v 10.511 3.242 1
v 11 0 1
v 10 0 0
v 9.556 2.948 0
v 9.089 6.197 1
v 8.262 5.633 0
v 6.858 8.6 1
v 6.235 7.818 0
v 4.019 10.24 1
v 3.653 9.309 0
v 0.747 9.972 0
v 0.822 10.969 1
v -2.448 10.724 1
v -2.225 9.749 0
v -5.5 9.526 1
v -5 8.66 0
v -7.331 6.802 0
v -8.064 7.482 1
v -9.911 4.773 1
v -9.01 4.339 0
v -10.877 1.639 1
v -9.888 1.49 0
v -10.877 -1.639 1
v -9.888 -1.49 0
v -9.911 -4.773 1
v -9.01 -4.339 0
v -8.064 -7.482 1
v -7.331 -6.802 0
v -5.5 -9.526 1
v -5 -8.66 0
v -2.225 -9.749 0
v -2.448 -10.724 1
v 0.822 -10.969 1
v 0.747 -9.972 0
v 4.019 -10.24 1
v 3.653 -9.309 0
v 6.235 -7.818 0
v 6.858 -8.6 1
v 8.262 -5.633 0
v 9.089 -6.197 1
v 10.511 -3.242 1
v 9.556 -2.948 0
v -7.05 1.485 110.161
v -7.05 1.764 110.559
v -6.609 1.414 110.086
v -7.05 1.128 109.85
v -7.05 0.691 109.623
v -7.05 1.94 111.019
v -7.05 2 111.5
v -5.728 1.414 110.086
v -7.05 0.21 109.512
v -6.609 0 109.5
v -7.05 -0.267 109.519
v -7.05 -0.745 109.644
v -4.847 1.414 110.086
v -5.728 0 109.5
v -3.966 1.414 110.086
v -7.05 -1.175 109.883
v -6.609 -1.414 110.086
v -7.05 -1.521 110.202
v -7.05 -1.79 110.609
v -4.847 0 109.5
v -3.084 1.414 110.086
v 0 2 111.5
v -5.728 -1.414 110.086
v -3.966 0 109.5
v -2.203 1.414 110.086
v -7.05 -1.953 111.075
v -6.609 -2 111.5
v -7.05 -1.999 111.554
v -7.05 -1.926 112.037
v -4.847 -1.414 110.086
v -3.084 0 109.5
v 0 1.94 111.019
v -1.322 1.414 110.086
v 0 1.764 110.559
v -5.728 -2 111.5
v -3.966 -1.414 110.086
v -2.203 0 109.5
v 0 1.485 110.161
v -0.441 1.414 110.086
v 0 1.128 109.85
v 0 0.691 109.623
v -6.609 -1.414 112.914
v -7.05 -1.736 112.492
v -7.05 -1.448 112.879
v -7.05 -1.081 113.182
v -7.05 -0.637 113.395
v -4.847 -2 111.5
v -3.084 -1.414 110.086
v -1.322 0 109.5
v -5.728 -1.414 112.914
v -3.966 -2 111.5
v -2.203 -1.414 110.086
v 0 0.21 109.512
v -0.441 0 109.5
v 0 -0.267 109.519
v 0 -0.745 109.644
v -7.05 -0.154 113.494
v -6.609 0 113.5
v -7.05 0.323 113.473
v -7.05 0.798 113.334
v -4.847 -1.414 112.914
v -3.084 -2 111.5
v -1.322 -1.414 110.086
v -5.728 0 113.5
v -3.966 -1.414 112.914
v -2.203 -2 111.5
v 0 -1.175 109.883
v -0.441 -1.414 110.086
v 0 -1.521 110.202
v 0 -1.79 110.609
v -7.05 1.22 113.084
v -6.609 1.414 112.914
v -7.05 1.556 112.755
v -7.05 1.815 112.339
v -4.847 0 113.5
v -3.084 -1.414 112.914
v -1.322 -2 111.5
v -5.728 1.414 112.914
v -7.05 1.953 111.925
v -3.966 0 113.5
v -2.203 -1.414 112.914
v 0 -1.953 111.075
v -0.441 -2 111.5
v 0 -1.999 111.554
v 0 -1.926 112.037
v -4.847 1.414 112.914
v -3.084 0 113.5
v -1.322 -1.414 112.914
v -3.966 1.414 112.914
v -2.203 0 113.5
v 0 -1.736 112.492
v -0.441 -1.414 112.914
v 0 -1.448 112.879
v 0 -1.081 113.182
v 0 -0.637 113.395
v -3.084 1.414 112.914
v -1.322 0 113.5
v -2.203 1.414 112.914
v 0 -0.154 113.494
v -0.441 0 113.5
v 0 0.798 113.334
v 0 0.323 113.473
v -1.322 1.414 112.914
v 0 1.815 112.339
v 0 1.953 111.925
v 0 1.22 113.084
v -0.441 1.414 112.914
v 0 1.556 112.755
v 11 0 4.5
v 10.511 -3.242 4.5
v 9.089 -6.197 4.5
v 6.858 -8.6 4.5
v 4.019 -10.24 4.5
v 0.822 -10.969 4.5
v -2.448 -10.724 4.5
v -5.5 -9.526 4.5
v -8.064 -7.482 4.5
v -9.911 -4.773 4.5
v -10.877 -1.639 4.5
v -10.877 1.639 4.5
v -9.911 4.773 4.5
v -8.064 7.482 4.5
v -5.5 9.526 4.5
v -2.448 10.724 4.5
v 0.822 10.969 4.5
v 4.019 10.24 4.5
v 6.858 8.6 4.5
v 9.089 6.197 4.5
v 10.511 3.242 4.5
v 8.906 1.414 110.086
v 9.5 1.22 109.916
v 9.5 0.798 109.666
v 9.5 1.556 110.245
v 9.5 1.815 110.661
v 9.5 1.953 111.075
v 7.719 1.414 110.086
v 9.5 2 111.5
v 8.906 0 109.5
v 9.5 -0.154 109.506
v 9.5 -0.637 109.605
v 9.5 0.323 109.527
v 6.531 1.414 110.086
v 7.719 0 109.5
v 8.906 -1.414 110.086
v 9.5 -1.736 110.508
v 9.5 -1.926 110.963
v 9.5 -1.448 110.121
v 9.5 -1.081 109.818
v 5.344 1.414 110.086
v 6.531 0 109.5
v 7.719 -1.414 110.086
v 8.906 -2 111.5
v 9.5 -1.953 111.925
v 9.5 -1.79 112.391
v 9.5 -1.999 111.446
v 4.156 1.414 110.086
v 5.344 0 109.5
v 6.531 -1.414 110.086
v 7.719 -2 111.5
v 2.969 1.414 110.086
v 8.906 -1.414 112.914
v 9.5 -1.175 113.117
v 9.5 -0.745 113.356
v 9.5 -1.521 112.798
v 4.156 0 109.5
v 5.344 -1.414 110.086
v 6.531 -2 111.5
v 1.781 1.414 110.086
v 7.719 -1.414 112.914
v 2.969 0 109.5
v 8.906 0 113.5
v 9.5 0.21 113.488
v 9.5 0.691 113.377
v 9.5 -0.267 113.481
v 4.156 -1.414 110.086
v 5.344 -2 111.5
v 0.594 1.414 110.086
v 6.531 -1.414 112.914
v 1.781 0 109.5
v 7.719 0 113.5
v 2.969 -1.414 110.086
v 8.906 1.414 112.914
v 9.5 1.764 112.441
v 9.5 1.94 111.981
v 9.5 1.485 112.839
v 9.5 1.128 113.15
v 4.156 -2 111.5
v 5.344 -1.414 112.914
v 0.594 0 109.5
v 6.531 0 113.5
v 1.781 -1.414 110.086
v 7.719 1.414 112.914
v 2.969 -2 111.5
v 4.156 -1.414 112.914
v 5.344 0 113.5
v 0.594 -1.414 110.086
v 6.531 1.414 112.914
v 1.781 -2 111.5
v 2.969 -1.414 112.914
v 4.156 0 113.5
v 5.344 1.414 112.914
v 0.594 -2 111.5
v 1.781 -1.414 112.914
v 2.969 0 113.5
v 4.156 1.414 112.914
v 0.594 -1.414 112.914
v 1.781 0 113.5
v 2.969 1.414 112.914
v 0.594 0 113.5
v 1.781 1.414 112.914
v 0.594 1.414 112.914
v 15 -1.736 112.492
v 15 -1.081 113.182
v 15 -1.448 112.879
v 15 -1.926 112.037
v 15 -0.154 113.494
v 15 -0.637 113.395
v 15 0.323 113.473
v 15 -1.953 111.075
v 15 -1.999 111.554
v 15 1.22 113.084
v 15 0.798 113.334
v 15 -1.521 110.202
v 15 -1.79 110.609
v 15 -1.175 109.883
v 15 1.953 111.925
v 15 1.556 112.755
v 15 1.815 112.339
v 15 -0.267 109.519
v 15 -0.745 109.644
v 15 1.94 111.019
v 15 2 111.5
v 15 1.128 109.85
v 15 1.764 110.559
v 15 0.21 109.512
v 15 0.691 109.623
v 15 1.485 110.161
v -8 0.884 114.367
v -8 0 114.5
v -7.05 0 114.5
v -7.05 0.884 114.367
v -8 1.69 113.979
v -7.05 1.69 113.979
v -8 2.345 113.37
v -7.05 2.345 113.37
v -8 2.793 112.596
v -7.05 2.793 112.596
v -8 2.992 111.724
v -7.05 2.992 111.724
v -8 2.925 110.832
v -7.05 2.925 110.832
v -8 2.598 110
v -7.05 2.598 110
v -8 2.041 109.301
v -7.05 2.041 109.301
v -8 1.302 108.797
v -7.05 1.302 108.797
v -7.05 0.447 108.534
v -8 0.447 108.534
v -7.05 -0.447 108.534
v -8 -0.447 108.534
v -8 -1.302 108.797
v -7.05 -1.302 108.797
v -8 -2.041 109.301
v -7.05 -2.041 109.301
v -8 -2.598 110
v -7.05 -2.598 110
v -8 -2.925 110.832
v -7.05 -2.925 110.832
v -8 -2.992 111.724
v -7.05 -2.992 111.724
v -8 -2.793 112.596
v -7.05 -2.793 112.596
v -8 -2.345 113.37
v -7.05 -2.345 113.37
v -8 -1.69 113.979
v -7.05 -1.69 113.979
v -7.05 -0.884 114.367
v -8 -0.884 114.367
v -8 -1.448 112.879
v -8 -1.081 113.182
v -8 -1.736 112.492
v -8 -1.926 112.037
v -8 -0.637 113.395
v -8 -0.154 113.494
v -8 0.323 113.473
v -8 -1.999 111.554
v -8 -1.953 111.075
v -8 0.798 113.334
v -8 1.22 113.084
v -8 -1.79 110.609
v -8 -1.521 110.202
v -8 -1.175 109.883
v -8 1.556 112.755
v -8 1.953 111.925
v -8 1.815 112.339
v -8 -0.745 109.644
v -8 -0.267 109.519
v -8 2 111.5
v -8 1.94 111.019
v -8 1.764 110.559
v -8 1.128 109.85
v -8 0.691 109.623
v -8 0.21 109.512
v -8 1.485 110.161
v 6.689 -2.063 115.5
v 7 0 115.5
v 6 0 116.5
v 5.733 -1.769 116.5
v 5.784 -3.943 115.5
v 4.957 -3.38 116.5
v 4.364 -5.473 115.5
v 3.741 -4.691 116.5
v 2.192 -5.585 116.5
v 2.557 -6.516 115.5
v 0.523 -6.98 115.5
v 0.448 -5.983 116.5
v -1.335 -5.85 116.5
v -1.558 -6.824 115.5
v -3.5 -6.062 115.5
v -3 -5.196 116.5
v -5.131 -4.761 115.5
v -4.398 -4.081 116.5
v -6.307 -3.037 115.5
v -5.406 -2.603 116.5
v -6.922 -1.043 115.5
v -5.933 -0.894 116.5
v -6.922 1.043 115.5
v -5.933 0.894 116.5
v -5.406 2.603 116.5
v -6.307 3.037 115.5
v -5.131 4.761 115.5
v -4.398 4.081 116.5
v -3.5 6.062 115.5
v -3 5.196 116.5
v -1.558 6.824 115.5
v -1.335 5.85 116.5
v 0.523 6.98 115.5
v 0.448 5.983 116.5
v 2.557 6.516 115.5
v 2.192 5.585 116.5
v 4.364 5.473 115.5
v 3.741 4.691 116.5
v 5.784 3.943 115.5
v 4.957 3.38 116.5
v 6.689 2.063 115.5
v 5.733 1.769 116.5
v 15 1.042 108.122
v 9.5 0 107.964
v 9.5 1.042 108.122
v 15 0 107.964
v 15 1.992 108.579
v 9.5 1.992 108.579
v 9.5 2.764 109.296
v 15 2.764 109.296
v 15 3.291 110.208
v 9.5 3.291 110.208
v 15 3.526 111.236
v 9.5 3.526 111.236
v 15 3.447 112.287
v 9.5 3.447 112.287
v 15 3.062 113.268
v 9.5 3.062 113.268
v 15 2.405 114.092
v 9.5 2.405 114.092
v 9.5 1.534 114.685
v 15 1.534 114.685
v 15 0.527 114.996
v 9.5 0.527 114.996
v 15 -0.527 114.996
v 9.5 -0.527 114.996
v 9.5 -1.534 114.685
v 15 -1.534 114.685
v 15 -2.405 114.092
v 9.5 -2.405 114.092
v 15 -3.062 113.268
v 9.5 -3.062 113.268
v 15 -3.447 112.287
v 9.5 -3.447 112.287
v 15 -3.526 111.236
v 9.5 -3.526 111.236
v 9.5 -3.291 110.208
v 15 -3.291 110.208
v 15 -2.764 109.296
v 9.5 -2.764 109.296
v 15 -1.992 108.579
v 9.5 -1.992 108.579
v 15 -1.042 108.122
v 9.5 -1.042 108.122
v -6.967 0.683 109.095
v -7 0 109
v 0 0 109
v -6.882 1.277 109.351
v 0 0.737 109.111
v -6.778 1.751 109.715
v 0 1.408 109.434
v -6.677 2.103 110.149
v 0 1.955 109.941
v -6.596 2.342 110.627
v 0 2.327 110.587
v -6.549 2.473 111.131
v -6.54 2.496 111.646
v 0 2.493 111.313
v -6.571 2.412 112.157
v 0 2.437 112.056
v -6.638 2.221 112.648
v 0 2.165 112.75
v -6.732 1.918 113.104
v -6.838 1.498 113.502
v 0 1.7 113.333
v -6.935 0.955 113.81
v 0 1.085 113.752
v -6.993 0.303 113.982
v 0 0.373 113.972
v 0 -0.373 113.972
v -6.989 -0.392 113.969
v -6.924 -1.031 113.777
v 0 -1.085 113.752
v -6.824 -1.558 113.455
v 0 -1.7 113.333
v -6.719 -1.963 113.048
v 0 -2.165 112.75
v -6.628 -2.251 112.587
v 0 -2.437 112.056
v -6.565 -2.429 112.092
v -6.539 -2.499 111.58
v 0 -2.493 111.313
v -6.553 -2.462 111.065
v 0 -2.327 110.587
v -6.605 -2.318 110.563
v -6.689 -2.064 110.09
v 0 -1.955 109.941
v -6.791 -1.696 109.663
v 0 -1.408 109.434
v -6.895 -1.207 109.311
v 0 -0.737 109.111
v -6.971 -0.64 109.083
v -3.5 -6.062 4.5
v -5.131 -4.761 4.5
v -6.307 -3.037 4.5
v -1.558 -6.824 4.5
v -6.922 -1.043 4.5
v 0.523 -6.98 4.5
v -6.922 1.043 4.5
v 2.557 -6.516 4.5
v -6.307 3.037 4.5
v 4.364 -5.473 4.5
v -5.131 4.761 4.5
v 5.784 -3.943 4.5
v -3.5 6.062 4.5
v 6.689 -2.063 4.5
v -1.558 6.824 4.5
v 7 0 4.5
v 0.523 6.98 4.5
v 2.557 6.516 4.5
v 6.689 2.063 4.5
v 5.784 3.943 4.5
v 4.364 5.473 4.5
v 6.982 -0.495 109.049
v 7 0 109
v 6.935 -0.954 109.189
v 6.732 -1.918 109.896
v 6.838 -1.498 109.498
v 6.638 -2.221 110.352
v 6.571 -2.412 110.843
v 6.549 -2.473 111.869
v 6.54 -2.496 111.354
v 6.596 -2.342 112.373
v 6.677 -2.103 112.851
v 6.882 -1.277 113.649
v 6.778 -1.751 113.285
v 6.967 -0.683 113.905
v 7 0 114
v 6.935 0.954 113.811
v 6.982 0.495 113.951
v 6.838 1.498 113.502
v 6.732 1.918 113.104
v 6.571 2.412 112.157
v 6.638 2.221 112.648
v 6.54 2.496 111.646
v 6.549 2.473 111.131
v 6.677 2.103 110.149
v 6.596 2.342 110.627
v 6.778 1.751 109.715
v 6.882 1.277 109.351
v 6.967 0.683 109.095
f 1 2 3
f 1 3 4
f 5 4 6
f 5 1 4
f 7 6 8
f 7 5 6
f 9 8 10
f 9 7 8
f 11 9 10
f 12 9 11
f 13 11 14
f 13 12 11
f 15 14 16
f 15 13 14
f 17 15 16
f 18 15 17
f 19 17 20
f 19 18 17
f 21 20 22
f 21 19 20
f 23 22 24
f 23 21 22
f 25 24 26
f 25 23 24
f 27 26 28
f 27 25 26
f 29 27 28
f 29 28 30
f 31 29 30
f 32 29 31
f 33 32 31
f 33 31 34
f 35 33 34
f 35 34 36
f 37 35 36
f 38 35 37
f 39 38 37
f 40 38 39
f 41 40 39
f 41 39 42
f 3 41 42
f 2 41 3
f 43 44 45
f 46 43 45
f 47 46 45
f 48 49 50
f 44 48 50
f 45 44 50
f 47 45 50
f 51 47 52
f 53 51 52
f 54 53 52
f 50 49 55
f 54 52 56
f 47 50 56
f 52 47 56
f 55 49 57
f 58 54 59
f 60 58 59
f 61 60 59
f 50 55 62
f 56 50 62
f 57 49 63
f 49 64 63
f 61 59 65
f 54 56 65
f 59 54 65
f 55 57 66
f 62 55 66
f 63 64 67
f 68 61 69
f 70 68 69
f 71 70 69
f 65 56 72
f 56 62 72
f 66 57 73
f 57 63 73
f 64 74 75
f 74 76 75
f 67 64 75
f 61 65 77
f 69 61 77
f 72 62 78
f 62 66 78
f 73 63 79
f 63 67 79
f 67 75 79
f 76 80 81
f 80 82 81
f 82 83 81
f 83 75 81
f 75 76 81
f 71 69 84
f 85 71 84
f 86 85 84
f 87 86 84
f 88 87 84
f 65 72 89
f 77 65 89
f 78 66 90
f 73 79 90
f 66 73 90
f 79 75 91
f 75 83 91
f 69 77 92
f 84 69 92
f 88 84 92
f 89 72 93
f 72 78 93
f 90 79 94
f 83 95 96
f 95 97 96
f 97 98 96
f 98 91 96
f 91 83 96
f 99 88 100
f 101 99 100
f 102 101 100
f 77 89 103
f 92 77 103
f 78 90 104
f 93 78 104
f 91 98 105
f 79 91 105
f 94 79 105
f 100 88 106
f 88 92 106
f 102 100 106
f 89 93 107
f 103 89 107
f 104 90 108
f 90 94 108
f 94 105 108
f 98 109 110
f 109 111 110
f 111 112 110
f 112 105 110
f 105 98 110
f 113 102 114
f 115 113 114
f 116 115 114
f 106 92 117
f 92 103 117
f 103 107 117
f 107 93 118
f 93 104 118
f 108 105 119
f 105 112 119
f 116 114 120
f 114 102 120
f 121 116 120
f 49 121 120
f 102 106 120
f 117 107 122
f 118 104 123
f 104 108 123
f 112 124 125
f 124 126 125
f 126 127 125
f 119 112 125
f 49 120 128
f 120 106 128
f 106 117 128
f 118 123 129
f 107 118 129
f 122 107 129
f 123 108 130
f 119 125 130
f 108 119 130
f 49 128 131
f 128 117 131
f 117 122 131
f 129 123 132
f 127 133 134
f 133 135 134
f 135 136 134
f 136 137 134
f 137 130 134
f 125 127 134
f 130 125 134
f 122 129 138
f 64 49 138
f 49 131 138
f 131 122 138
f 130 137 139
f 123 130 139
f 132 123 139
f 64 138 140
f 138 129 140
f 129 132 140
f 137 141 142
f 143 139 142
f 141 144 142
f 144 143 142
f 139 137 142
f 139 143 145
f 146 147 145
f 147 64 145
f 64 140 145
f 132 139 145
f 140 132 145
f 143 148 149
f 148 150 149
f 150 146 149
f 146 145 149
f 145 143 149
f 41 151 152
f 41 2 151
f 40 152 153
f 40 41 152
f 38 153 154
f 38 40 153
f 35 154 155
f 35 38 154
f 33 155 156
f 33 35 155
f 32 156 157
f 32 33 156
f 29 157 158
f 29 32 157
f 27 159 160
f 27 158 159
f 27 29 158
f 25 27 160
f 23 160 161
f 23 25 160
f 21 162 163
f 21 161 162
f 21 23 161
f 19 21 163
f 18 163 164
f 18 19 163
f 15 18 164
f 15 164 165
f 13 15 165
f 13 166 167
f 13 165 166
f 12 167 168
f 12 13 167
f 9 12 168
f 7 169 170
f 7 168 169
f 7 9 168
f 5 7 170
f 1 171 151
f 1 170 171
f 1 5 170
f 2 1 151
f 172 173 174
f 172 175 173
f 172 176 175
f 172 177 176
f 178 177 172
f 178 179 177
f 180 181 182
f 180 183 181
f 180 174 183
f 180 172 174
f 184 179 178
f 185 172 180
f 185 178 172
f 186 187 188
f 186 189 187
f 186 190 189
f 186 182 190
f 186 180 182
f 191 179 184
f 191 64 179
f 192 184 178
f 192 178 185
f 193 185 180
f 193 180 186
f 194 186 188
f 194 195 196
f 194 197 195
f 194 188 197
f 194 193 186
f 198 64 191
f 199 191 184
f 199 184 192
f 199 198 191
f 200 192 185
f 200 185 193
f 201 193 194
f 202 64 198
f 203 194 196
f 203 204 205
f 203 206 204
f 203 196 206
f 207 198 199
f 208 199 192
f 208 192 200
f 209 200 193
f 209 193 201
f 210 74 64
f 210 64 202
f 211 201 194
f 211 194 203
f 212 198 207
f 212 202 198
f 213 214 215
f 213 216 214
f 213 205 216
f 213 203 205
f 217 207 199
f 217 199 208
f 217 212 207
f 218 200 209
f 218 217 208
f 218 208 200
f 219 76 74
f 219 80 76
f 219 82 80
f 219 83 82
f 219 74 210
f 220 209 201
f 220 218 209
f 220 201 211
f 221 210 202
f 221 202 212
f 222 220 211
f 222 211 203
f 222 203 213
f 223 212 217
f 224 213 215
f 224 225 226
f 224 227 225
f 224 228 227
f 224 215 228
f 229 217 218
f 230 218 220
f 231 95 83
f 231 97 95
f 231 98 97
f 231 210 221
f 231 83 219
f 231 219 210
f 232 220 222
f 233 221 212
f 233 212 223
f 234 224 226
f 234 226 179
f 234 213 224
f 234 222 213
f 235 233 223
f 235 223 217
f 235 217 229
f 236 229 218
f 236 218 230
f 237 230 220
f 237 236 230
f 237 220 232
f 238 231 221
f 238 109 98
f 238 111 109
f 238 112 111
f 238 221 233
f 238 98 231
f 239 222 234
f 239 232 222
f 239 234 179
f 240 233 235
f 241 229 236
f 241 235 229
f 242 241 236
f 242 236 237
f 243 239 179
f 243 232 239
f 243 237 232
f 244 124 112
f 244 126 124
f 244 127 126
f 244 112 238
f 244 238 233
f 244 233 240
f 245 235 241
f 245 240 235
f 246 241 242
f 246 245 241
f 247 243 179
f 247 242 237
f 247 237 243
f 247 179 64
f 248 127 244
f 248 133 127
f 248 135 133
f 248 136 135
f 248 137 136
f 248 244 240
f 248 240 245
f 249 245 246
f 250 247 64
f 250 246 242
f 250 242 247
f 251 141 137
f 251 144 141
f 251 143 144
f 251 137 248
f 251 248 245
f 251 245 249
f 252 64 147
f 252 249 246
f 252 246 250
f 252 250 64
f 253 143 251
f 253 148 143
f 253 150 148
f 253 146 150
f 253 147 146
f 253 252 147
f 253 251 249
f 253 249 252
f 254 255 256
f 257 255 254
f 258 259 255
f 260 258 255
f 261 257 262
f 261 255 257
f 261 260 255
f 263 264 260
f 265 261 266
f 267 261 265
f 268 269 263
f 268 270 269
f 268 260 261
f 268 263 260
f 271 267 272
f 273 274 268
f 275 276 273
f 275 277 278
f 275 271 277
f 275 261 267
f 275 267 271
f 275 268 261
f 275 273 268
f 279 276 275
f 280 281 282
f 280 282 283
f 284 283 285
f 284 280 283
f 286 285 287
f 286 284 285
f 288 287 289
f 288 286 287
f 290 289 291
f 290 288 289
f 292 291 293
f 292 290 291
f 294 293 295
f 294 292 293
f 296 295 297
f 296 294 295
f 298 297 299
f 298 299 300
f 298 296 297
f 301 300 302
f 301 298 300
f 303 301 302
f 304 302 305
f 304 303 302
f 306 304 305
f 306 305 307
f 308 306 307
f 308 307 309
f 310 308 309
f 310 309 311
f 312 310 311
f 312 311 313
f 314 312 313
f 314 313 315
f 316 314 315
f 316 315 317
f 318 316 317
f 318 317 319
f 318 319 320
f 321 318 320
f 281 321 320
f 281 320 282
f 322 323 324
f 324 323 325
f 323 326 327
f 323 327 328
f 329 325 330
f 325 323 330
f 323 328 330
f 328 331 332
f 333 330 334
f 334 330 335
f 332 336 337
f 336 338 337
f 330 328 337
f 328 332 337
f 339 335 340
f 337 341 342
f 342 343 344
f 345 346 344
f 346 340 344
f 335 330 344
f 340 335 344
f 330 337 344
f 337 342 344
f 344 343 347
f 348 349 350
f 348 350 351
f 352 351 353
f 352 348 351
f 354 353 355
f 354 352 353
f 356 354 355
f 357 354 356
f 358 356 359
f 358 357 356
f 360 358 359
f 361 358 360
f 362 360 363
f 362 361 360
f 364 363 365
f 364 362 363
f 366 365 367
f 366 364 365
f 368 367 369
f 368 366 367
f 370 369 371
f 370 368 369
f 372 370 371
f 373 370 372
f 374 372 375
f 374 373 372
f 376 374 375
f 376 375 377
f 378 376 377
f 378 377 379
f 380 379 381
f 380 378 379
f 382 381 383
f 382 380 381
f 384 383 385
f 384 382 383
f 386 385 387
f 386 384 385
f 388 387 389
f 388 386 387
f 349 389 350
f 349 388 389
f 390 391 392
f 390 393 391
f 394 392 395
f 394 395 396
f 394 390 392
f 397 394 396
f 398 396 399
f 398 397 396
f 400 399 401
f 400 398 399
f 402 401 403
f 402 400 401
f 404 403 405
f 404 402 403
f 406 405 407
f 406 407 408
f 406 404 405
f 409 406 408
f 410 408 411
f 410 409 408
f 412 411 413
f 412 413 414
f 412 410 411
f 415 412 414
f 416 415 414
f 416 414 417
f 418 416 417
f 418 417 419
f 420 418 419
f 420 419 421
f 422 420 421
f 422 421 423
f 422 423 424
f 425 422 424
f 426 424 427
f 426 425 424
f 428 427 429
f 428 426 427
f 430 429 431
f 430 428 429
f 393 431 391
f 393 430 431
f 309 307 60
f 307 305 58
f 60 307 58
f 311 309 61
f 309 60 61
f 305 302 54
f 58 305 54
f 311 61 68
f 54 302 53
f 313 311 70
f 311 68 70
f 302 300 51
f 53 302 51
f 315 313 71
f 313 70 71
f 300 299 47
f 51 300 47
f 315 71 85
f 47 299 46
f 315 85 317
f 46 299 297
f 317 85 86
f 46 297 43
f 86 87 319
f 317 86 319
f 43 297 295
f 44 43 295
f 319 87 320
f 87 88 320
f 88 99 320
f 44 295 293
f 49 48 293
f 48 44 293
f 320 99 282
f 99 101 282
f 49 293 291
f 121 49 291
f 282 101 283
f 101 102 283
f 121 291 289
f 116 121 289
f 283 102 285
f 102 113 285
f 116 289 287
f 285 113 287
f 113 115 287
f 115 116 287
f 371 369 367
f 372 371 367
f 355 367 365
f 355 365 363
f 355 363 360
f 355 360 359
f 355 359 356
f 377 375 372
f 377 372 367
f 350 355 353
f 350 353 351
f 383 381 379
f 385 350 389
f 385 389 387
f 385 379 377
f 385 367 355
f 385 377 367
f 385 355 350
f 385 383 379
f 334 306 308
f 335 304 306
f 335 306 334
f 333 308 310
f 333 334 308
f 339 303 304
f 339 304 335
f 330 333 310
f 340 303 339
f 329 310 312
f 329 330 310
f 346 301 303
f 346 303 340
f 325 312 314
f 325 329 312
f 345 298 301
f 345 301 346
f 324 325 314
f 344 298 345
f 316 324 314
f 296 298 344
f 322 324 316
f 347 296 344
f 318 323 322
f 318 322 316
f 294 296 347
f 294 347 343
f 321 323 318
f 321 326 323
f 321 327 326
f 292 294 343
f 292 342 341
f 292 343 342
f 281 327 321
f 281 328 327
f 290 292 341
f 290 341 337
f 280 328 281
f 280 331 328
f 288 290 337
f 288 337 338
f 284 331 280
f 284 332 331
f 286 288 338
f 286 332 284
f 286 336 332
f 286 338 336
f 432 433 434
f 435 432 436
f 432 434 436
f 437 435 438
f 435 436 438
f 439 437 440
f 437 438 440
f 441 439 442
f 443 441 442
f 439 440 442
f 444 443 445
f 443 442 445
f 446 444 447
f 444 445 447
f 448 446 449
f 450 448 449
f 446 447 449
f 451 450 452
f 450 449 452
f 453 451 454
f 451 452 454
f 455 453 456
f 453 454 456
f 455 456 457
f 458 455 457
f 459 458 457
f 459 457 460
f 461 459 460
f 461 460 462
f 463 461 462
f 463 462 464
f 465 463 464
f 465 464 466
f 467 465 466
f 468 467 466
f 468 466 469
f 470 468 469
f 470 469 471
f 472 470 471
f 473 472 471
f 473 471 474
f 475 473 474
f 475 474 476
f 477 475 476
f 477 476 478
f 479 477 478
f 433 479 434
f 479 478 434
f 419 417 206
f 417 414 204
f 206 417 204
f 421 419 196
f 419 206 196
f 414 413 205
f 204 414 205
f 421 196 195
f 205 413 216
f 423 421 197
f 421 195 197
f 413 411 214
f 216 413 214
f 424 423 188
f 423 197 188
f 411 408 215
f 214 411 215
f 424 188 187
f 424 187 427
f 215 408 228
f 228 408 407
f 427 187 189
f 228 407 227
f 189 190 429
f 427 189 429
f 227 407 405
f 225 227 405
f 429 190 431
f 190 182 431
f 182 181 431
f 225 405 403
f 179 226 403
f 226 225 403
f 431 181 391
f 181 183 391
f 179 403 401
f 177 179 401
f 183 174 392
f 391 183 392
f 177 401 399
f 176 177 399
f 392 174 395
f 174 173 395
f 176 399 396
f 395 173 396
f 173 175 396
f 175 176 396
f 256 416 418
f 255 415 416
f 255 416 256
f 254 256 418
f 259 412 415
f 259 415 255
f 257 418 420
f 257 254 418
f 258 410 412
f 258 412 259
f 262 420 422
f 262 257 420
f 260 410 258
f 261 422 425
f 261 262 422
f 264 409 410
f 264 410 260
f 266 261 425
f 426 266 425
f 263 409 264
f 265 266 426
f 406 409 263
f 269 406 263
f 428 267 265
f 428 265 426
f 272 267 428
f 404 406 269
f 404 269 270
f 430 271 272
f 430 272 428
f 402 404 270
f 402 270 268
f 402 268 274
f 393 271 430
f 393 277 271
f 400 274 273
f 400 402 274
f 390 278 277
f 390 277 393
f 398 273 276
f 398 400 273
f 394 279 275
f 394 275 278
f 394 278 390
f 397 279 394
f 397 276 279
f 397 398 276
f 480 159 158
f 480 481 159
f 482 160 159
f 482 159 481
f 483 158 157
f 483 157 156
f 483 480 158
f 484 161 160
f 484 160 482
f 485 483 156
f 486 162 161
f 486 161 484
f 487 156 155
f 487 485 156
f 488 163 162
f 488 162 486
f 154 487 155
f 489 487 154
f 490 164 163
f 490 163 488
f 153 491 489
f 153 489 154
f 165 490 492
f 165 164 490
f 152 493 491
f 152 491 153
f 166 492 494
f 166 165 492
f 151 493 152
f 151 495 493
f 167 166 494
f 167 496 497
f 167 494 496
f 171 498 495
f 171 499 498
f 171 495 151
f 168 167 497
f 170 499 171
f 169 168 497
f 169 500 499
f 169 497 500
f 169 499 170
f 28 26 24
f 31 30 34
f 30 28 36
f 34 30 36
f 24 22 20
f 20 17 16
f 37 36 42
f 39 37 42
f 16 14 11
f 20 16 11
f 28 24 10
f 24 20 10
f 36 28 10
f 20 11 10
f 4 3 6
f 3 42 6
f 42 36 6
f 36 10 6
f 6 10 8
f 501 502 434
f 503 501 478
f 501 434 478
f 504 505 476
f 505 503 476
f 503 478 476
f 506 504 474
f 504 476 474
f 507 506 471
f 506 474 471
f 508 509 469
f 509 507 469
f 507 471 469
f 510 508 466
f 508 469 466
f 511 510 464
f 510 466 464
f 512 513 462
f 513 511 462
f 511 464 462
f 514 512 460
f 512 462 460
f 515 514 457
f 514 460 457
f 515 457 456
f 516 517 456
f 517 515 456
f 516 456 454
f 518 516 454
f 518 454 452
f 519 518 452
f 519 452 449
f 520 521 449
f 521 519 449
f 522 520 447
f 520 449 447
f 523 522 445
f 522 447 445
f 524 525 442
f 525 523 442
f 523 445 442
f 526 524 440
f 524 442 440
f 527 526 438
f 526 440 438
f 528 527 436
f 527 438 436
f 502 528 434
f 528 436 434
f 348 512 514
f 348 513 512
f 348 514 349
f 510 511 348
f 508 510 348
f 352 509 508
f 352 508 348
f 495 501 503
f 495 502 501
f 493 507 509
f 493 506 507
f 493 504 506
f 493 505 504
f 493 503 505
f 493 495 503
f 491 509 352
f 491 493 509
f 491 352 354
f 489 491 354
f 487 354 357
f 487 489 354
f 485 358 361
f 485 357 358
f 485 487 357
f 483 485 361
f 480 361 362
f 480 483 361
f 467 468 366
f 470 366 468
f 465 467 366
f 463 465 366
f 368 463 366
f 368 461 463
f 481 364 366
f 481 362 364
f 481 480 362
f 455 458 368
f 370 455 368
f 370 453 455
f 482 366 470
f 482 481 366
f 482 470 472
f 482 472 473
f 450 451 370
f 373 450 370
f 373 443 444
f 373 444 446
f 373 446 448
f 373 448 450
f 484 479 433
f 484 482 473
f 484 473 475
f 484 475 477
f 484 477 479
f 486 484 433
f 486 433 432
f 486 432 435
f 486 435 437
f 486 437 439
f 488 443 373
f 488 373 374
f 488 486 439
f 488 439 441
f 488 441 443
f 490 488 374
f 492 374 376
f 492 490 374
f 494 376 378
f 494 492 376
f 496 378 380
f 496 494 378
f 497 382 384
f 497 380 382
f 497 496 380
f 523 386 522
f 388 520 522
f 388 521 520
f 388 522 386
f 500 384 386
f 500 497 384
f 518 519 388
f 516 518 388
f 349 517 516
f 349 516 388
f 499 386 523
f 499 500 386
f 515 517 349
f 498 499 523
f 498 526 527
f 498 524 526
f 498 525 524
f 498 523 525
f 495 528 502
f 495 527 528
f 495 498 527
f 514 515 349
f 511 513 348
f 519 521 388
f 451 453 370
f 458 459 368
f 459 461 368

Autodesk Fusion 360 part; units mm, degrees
sketch "Sketch1" plane through (0, 0, 0) normal (0, 0, 1) x (1, 0, 0)
  circle A0 centre (0, 0) radius 11
  dimension "d1" = 22
extrude "Extrude1" add sketch "Sketch1" along normal blind 4.5 makes body 1
sketch "Sketch2" plane through (0, 0, 4.5) normal (0, 0, 1) x (1, 0, 0)
  circle A0 centre (0, 0) radius 11
  circle A1 centre (0, 0) radius 7
  dimension "d4" = 14
extrude "Extrude2" add sketch "Sketch2" along normal blind 112 contours A1 bodies 1
sketch "Sketch3" plane through (0, 0, 0) normal (1, 0, 0) x (0, 0, -1)
  line L0 (-116.5, 0) -> (-111.5, 0) construction
  circle A0 centre (-111.5, 0) radius 2.5
  point P0 (-116.5, 0)
  dimension "d7" = 5
  dimension "d8" = 5
extrude "Extrude3" cut sketch "Sketch3" along normal mid plane 50 bodies 1
chamfer "Chamfer1" distance 1 angle 45 1 edges at (-6.5263, -2.5313, 116.5) on bodies 1
chamfer "Chamfer2" distance 1 angle 45 1 edges at (-10.2556, -3.9778, 0) on bodies 1
sketch "Sketch4" plane through (0, 0, 0) normal (1, 0, 0) x (0, 0, -1)
  spline S0 degree 3 poles (-111.5, 2.5) (-111.1829, 2.5) (-110.8469, 2.4361) (-110.2319, 2.1801) (-109.9527, 1.9882) (-109.5119, 1.5474) (-109.3199, 1.2682) (-109.0639, 0.653) (-109, 0.3169) (-109, -0.3169) (-109.0639, -0.653) (-109.3199, -1.2682) (-109.5119, -1.5474) (-109.9527, -1.9882) (-110.2319, -2.1801) (-110.8469, -2.4361) (-111.1829, -2.5) (-111.8171, -2.5) (-112.1531, -2.4361) (-112.7681, -2.1801) (-113.0473, -1.9882) (-113.4881, -1.5474) (-113.6801, -1.2682) (-113.9361, -0.653) (-114, -0.3169) (-114, 0.3169) (-113.9361, 0.653) (-113.6801, 1.2682) (-113.4881, 1.5474) (-113.0473, 1.9882) (-112.7681, 2.1801) (-112.1531, 2.4361) (-111.8171, 2.5) (-111.5, 2.5) knots 0 0 0 0 0.095117 0.095117 0.190234 0.190234 0.285292 0.285292 0.38035 0.38035 0.475408 0.475408 0.570466 0.570466 0.665583 0.665583 0.7607 0.7607 0.855818 0.855818 0.950935 0.950935 1.045993 1.045993 1.141051 1.141051 1.236109 1.236109 1.331167 1.331167 1.426284 1.426284 1.521401 1.521401 1.521401 1.521401
  spline S1 degree 3 poles (-111.5, 2) (-111.2502, 2) (-110.9743, 1.9475) (-110.7315, 1.8465) (-110.4886, 1.7454) (-110.2596, 1.588) (-110.0858, 1.4142) (-109.9121, 1.2406) (-109.7546, 1.0114) (-109.6535, 0.7685) (-109.5525, 0.5257) (-109.5, 0.2496) (-109.5, 0) (-109.5, -0.2496) (-109.5525, -0.5257) (-109.6535, -0.7685) (-109.7546, -1.0114) (-109.9121, -1.2406) (-110.0858, -1.4142) (-110.2596, -1.588) (-110.4886, -1.7454) (-110.7315, -1.8465) (-110.9743, -1.9475) (-111.2502, -2) (-111.5, -2) (-111.7498, -2) (-112.0257, -1.9475) (-112.2685, -1.8465) (-112.5114, -1.7454) (-112.7404, -1.588) (-112.9142, -1.4142) (-113.0879, -1.2406) (-113.2454, -1.0114) (-113.3465, -0.7685) (-113.4475, -0.5257) (-113.5, -0.2496) (-113.5, 0) (-113.5, 0.2496) (-113.4475, 0.5257) (-113.3465, 0.7685) (-113.2454, 1.0114) (-113.0879, 1.2406) (-112.9142, 1.4142) (-112.7404, 1.588) (-112.5114, 1.7454) (-112.2685, 1.8465) (-112.0257, 1.9475) (-111.7498, 2) (-111.5, 2) knots 0 0 0 0 0.095117 0.095117 0.095117 0.190234 0.190234 0.190234 0.285292 0.285292 0.285292 0.38035 0.38035 0.38035 0.475408 0.475408 0.475408 0.570466 0.570466 0.570466 0.665583 0.665583 0.665583 0.7607 0.7607 0.7607 0.855818 0.855818 0.855818 0.950935 0.950935 0.950935 1.045993 1.045993 1.045993 1.141051 1.141051 1.141051 1.236109 1.236109 1.236109 1.331167 1.331167 1.331167 1.426284 1.426284 1.426284 1.521401 1.521401 1.521401 1.521401
  dimension "d13" = 0.5
extrude "Extrude4" add sketch "Sketch4" along normal blind 15 and the other way blind 8 separate body contours S1 makes body 2
sketch "Sketch6" plane through (-8, 0, 0) normal (-1, 0, 0) x (0, 0, 1)
  spline S0 degree 3 poles (111.5, 2) (111.2502, 2) (110.9743, 1.9475) (110.7315, 1.8465) (110.4886, 1.7454) (110.2596, 1.588) (110.0858, 1.4142) (109.9121, 1.2406) (109.7546, 1.0114) (109.6535, 0.7685) (109.5525, 0.5257) (109.5, 0.2496) (109.5, 0) (109.5, -0.2496) (109.5525, -0.5257) (109.6535, -0.7685) (109.7546, -1.0114) (109.9121, -1.2406) (110.0858, -1.4142) (110.2596, -1.588) (110.4886, -1.7454) (110.7315, -1.8465) (110.9743, -1.9475) (111.2502, -2) (111.5, -2) (111.7498, -2) (112.0257, -1.9475) (112.2685, -1.8465) (112.5114, -1.7454) (112.7404, -1.588) (112.9142, -1.4142) (113.0879, -1.2406) (113.2454, -1.0114) (113.3465, -0.7685) (113.4475, -0.5257) (113.5, -0.2496) (113.5, 0) (113.5, 0.2496) (113.4475, 0.5257) (113.3465, 0.7685) (113.2454, 1.0114) (113.0879, 1.2406) (112.9142, 1.4142) (112.7404, 1.588) (112.5114, 1.7454) (112.2685, 1.8465) (112.0257, 1.9475) (111.7498, 2) (111.5, 2) knots 0 0 0 0 0.095117 0.095117 0.095117 0.190234 0.190234 0.190234 0.285292 0.285292 0.285292 0.38035 0.38035 0.38035 0.475408 0.475408 0.475408 0.570466 0.570466 0.570466 0.665583 0.665583 0.665583 0.7607 0.7607 0.7607 0.855818 0.855818 0.855818 0.950935 0.950935 0.950935 1.045993 1.045993 1.045993 1.141051 1.141051 1.141051 1.236109 1.236109 1.236109 1.331167 1.331167 1.331167 1.426284 1.426284 1.426284 1.521401 1.521401 1.521401 1.521401
  circle A0 centre (111.5, 0) radius 3
  dimension "d18" = 6
extrude "Extrude5" add sketch "Sketch6" against normal blind 0.95 bodies 2
sketch "Sketch7" plane through (15, 0, 0) normal (1, 0, 0) x (0, 0, -1)
  spline S0 degree 3 poles (-111.5, 2) (-111.7498, 2) (-112.0257, 1.9475) (-112.2685, 1.8465) (-112.5114, 1.7454) (-112.7404, 1.588) (-112.9142, 1.4142) (-113.0879, 1.2406) (-113.2454, 1.0114) (-113.3465, 0.7685) (-113.4475, 0.5257) (-113.5, 0.2496) (-113.5, 0) (-113.5, -0.2496) (-113.4475, -0.5257) (-113.3465, -0.7685) (-113.2454, -1.0114) (-113.0879, -1.2406) (-112.9142, -1.4142) (-112.7404, -1.588) (-112.5114, -1.7454) (-112.2685, -1.8465) (-112.0257, -1.9475) (-111.7498, -2) (-111.5, -2) (-111.2502, -2) (-110.9743, -1.9475) (-110.7315, -1.8465) (-110.4886, -1.7454) (-110.2596, -1.588) (-110.0858, -1.4142) (-109.9121, -1.2406) (-109.7546, -1.0114) (-109.6535, -0.7685) (-109.5525, -0.5257) (-109.5, -0.2496) (-109.5, 0) (-109.5, 0.2496) (-109.5525, 0.5257) (-109.6535, 0.7685) (-109.7546, 1.0114) (-109.9121, 1.2406) (-110.0858, 1.4142) (-110.2596, 1.588) (-110.4886, 1.7454) (-110.7315, 1.8465) (-110.9743, 1.9475) (-111.2502, 2) (-111.5, 2) knots -1.521401 -1.521401 -1.521401 -1.521401 -1.426284 -1.426284 -1.426284 -1.331167 -1.331167 -1.331167 -1.236109 -1.236109 -1.236109 -1.141051 -1.141051 -1.141051 -1.045993 -1.045993 -1.045993 -0.950935 -0.950935 -0.950935 -0.855818 -0.855818 -0.855818 -0.7607 -0.7607 -0.7607 -0.665583 -0.665583 -0.665583 -0.570466 -0.570466 -0.570466 -0.475408 -0.475408 -0.475408 -0.38035 -0.38035 -0.38035 -0.285292 -0.285292 -0.285292 -0.190234 -0.190234 -0.190234 -0.095117 -0.095117 -0.095117 0 0 0 0
  circle A0 centre (-111.5, 0) radius 3.5355
extrude "Extrude6" add sketch "Sketch7" against normal blind 5.5 bodies 2
